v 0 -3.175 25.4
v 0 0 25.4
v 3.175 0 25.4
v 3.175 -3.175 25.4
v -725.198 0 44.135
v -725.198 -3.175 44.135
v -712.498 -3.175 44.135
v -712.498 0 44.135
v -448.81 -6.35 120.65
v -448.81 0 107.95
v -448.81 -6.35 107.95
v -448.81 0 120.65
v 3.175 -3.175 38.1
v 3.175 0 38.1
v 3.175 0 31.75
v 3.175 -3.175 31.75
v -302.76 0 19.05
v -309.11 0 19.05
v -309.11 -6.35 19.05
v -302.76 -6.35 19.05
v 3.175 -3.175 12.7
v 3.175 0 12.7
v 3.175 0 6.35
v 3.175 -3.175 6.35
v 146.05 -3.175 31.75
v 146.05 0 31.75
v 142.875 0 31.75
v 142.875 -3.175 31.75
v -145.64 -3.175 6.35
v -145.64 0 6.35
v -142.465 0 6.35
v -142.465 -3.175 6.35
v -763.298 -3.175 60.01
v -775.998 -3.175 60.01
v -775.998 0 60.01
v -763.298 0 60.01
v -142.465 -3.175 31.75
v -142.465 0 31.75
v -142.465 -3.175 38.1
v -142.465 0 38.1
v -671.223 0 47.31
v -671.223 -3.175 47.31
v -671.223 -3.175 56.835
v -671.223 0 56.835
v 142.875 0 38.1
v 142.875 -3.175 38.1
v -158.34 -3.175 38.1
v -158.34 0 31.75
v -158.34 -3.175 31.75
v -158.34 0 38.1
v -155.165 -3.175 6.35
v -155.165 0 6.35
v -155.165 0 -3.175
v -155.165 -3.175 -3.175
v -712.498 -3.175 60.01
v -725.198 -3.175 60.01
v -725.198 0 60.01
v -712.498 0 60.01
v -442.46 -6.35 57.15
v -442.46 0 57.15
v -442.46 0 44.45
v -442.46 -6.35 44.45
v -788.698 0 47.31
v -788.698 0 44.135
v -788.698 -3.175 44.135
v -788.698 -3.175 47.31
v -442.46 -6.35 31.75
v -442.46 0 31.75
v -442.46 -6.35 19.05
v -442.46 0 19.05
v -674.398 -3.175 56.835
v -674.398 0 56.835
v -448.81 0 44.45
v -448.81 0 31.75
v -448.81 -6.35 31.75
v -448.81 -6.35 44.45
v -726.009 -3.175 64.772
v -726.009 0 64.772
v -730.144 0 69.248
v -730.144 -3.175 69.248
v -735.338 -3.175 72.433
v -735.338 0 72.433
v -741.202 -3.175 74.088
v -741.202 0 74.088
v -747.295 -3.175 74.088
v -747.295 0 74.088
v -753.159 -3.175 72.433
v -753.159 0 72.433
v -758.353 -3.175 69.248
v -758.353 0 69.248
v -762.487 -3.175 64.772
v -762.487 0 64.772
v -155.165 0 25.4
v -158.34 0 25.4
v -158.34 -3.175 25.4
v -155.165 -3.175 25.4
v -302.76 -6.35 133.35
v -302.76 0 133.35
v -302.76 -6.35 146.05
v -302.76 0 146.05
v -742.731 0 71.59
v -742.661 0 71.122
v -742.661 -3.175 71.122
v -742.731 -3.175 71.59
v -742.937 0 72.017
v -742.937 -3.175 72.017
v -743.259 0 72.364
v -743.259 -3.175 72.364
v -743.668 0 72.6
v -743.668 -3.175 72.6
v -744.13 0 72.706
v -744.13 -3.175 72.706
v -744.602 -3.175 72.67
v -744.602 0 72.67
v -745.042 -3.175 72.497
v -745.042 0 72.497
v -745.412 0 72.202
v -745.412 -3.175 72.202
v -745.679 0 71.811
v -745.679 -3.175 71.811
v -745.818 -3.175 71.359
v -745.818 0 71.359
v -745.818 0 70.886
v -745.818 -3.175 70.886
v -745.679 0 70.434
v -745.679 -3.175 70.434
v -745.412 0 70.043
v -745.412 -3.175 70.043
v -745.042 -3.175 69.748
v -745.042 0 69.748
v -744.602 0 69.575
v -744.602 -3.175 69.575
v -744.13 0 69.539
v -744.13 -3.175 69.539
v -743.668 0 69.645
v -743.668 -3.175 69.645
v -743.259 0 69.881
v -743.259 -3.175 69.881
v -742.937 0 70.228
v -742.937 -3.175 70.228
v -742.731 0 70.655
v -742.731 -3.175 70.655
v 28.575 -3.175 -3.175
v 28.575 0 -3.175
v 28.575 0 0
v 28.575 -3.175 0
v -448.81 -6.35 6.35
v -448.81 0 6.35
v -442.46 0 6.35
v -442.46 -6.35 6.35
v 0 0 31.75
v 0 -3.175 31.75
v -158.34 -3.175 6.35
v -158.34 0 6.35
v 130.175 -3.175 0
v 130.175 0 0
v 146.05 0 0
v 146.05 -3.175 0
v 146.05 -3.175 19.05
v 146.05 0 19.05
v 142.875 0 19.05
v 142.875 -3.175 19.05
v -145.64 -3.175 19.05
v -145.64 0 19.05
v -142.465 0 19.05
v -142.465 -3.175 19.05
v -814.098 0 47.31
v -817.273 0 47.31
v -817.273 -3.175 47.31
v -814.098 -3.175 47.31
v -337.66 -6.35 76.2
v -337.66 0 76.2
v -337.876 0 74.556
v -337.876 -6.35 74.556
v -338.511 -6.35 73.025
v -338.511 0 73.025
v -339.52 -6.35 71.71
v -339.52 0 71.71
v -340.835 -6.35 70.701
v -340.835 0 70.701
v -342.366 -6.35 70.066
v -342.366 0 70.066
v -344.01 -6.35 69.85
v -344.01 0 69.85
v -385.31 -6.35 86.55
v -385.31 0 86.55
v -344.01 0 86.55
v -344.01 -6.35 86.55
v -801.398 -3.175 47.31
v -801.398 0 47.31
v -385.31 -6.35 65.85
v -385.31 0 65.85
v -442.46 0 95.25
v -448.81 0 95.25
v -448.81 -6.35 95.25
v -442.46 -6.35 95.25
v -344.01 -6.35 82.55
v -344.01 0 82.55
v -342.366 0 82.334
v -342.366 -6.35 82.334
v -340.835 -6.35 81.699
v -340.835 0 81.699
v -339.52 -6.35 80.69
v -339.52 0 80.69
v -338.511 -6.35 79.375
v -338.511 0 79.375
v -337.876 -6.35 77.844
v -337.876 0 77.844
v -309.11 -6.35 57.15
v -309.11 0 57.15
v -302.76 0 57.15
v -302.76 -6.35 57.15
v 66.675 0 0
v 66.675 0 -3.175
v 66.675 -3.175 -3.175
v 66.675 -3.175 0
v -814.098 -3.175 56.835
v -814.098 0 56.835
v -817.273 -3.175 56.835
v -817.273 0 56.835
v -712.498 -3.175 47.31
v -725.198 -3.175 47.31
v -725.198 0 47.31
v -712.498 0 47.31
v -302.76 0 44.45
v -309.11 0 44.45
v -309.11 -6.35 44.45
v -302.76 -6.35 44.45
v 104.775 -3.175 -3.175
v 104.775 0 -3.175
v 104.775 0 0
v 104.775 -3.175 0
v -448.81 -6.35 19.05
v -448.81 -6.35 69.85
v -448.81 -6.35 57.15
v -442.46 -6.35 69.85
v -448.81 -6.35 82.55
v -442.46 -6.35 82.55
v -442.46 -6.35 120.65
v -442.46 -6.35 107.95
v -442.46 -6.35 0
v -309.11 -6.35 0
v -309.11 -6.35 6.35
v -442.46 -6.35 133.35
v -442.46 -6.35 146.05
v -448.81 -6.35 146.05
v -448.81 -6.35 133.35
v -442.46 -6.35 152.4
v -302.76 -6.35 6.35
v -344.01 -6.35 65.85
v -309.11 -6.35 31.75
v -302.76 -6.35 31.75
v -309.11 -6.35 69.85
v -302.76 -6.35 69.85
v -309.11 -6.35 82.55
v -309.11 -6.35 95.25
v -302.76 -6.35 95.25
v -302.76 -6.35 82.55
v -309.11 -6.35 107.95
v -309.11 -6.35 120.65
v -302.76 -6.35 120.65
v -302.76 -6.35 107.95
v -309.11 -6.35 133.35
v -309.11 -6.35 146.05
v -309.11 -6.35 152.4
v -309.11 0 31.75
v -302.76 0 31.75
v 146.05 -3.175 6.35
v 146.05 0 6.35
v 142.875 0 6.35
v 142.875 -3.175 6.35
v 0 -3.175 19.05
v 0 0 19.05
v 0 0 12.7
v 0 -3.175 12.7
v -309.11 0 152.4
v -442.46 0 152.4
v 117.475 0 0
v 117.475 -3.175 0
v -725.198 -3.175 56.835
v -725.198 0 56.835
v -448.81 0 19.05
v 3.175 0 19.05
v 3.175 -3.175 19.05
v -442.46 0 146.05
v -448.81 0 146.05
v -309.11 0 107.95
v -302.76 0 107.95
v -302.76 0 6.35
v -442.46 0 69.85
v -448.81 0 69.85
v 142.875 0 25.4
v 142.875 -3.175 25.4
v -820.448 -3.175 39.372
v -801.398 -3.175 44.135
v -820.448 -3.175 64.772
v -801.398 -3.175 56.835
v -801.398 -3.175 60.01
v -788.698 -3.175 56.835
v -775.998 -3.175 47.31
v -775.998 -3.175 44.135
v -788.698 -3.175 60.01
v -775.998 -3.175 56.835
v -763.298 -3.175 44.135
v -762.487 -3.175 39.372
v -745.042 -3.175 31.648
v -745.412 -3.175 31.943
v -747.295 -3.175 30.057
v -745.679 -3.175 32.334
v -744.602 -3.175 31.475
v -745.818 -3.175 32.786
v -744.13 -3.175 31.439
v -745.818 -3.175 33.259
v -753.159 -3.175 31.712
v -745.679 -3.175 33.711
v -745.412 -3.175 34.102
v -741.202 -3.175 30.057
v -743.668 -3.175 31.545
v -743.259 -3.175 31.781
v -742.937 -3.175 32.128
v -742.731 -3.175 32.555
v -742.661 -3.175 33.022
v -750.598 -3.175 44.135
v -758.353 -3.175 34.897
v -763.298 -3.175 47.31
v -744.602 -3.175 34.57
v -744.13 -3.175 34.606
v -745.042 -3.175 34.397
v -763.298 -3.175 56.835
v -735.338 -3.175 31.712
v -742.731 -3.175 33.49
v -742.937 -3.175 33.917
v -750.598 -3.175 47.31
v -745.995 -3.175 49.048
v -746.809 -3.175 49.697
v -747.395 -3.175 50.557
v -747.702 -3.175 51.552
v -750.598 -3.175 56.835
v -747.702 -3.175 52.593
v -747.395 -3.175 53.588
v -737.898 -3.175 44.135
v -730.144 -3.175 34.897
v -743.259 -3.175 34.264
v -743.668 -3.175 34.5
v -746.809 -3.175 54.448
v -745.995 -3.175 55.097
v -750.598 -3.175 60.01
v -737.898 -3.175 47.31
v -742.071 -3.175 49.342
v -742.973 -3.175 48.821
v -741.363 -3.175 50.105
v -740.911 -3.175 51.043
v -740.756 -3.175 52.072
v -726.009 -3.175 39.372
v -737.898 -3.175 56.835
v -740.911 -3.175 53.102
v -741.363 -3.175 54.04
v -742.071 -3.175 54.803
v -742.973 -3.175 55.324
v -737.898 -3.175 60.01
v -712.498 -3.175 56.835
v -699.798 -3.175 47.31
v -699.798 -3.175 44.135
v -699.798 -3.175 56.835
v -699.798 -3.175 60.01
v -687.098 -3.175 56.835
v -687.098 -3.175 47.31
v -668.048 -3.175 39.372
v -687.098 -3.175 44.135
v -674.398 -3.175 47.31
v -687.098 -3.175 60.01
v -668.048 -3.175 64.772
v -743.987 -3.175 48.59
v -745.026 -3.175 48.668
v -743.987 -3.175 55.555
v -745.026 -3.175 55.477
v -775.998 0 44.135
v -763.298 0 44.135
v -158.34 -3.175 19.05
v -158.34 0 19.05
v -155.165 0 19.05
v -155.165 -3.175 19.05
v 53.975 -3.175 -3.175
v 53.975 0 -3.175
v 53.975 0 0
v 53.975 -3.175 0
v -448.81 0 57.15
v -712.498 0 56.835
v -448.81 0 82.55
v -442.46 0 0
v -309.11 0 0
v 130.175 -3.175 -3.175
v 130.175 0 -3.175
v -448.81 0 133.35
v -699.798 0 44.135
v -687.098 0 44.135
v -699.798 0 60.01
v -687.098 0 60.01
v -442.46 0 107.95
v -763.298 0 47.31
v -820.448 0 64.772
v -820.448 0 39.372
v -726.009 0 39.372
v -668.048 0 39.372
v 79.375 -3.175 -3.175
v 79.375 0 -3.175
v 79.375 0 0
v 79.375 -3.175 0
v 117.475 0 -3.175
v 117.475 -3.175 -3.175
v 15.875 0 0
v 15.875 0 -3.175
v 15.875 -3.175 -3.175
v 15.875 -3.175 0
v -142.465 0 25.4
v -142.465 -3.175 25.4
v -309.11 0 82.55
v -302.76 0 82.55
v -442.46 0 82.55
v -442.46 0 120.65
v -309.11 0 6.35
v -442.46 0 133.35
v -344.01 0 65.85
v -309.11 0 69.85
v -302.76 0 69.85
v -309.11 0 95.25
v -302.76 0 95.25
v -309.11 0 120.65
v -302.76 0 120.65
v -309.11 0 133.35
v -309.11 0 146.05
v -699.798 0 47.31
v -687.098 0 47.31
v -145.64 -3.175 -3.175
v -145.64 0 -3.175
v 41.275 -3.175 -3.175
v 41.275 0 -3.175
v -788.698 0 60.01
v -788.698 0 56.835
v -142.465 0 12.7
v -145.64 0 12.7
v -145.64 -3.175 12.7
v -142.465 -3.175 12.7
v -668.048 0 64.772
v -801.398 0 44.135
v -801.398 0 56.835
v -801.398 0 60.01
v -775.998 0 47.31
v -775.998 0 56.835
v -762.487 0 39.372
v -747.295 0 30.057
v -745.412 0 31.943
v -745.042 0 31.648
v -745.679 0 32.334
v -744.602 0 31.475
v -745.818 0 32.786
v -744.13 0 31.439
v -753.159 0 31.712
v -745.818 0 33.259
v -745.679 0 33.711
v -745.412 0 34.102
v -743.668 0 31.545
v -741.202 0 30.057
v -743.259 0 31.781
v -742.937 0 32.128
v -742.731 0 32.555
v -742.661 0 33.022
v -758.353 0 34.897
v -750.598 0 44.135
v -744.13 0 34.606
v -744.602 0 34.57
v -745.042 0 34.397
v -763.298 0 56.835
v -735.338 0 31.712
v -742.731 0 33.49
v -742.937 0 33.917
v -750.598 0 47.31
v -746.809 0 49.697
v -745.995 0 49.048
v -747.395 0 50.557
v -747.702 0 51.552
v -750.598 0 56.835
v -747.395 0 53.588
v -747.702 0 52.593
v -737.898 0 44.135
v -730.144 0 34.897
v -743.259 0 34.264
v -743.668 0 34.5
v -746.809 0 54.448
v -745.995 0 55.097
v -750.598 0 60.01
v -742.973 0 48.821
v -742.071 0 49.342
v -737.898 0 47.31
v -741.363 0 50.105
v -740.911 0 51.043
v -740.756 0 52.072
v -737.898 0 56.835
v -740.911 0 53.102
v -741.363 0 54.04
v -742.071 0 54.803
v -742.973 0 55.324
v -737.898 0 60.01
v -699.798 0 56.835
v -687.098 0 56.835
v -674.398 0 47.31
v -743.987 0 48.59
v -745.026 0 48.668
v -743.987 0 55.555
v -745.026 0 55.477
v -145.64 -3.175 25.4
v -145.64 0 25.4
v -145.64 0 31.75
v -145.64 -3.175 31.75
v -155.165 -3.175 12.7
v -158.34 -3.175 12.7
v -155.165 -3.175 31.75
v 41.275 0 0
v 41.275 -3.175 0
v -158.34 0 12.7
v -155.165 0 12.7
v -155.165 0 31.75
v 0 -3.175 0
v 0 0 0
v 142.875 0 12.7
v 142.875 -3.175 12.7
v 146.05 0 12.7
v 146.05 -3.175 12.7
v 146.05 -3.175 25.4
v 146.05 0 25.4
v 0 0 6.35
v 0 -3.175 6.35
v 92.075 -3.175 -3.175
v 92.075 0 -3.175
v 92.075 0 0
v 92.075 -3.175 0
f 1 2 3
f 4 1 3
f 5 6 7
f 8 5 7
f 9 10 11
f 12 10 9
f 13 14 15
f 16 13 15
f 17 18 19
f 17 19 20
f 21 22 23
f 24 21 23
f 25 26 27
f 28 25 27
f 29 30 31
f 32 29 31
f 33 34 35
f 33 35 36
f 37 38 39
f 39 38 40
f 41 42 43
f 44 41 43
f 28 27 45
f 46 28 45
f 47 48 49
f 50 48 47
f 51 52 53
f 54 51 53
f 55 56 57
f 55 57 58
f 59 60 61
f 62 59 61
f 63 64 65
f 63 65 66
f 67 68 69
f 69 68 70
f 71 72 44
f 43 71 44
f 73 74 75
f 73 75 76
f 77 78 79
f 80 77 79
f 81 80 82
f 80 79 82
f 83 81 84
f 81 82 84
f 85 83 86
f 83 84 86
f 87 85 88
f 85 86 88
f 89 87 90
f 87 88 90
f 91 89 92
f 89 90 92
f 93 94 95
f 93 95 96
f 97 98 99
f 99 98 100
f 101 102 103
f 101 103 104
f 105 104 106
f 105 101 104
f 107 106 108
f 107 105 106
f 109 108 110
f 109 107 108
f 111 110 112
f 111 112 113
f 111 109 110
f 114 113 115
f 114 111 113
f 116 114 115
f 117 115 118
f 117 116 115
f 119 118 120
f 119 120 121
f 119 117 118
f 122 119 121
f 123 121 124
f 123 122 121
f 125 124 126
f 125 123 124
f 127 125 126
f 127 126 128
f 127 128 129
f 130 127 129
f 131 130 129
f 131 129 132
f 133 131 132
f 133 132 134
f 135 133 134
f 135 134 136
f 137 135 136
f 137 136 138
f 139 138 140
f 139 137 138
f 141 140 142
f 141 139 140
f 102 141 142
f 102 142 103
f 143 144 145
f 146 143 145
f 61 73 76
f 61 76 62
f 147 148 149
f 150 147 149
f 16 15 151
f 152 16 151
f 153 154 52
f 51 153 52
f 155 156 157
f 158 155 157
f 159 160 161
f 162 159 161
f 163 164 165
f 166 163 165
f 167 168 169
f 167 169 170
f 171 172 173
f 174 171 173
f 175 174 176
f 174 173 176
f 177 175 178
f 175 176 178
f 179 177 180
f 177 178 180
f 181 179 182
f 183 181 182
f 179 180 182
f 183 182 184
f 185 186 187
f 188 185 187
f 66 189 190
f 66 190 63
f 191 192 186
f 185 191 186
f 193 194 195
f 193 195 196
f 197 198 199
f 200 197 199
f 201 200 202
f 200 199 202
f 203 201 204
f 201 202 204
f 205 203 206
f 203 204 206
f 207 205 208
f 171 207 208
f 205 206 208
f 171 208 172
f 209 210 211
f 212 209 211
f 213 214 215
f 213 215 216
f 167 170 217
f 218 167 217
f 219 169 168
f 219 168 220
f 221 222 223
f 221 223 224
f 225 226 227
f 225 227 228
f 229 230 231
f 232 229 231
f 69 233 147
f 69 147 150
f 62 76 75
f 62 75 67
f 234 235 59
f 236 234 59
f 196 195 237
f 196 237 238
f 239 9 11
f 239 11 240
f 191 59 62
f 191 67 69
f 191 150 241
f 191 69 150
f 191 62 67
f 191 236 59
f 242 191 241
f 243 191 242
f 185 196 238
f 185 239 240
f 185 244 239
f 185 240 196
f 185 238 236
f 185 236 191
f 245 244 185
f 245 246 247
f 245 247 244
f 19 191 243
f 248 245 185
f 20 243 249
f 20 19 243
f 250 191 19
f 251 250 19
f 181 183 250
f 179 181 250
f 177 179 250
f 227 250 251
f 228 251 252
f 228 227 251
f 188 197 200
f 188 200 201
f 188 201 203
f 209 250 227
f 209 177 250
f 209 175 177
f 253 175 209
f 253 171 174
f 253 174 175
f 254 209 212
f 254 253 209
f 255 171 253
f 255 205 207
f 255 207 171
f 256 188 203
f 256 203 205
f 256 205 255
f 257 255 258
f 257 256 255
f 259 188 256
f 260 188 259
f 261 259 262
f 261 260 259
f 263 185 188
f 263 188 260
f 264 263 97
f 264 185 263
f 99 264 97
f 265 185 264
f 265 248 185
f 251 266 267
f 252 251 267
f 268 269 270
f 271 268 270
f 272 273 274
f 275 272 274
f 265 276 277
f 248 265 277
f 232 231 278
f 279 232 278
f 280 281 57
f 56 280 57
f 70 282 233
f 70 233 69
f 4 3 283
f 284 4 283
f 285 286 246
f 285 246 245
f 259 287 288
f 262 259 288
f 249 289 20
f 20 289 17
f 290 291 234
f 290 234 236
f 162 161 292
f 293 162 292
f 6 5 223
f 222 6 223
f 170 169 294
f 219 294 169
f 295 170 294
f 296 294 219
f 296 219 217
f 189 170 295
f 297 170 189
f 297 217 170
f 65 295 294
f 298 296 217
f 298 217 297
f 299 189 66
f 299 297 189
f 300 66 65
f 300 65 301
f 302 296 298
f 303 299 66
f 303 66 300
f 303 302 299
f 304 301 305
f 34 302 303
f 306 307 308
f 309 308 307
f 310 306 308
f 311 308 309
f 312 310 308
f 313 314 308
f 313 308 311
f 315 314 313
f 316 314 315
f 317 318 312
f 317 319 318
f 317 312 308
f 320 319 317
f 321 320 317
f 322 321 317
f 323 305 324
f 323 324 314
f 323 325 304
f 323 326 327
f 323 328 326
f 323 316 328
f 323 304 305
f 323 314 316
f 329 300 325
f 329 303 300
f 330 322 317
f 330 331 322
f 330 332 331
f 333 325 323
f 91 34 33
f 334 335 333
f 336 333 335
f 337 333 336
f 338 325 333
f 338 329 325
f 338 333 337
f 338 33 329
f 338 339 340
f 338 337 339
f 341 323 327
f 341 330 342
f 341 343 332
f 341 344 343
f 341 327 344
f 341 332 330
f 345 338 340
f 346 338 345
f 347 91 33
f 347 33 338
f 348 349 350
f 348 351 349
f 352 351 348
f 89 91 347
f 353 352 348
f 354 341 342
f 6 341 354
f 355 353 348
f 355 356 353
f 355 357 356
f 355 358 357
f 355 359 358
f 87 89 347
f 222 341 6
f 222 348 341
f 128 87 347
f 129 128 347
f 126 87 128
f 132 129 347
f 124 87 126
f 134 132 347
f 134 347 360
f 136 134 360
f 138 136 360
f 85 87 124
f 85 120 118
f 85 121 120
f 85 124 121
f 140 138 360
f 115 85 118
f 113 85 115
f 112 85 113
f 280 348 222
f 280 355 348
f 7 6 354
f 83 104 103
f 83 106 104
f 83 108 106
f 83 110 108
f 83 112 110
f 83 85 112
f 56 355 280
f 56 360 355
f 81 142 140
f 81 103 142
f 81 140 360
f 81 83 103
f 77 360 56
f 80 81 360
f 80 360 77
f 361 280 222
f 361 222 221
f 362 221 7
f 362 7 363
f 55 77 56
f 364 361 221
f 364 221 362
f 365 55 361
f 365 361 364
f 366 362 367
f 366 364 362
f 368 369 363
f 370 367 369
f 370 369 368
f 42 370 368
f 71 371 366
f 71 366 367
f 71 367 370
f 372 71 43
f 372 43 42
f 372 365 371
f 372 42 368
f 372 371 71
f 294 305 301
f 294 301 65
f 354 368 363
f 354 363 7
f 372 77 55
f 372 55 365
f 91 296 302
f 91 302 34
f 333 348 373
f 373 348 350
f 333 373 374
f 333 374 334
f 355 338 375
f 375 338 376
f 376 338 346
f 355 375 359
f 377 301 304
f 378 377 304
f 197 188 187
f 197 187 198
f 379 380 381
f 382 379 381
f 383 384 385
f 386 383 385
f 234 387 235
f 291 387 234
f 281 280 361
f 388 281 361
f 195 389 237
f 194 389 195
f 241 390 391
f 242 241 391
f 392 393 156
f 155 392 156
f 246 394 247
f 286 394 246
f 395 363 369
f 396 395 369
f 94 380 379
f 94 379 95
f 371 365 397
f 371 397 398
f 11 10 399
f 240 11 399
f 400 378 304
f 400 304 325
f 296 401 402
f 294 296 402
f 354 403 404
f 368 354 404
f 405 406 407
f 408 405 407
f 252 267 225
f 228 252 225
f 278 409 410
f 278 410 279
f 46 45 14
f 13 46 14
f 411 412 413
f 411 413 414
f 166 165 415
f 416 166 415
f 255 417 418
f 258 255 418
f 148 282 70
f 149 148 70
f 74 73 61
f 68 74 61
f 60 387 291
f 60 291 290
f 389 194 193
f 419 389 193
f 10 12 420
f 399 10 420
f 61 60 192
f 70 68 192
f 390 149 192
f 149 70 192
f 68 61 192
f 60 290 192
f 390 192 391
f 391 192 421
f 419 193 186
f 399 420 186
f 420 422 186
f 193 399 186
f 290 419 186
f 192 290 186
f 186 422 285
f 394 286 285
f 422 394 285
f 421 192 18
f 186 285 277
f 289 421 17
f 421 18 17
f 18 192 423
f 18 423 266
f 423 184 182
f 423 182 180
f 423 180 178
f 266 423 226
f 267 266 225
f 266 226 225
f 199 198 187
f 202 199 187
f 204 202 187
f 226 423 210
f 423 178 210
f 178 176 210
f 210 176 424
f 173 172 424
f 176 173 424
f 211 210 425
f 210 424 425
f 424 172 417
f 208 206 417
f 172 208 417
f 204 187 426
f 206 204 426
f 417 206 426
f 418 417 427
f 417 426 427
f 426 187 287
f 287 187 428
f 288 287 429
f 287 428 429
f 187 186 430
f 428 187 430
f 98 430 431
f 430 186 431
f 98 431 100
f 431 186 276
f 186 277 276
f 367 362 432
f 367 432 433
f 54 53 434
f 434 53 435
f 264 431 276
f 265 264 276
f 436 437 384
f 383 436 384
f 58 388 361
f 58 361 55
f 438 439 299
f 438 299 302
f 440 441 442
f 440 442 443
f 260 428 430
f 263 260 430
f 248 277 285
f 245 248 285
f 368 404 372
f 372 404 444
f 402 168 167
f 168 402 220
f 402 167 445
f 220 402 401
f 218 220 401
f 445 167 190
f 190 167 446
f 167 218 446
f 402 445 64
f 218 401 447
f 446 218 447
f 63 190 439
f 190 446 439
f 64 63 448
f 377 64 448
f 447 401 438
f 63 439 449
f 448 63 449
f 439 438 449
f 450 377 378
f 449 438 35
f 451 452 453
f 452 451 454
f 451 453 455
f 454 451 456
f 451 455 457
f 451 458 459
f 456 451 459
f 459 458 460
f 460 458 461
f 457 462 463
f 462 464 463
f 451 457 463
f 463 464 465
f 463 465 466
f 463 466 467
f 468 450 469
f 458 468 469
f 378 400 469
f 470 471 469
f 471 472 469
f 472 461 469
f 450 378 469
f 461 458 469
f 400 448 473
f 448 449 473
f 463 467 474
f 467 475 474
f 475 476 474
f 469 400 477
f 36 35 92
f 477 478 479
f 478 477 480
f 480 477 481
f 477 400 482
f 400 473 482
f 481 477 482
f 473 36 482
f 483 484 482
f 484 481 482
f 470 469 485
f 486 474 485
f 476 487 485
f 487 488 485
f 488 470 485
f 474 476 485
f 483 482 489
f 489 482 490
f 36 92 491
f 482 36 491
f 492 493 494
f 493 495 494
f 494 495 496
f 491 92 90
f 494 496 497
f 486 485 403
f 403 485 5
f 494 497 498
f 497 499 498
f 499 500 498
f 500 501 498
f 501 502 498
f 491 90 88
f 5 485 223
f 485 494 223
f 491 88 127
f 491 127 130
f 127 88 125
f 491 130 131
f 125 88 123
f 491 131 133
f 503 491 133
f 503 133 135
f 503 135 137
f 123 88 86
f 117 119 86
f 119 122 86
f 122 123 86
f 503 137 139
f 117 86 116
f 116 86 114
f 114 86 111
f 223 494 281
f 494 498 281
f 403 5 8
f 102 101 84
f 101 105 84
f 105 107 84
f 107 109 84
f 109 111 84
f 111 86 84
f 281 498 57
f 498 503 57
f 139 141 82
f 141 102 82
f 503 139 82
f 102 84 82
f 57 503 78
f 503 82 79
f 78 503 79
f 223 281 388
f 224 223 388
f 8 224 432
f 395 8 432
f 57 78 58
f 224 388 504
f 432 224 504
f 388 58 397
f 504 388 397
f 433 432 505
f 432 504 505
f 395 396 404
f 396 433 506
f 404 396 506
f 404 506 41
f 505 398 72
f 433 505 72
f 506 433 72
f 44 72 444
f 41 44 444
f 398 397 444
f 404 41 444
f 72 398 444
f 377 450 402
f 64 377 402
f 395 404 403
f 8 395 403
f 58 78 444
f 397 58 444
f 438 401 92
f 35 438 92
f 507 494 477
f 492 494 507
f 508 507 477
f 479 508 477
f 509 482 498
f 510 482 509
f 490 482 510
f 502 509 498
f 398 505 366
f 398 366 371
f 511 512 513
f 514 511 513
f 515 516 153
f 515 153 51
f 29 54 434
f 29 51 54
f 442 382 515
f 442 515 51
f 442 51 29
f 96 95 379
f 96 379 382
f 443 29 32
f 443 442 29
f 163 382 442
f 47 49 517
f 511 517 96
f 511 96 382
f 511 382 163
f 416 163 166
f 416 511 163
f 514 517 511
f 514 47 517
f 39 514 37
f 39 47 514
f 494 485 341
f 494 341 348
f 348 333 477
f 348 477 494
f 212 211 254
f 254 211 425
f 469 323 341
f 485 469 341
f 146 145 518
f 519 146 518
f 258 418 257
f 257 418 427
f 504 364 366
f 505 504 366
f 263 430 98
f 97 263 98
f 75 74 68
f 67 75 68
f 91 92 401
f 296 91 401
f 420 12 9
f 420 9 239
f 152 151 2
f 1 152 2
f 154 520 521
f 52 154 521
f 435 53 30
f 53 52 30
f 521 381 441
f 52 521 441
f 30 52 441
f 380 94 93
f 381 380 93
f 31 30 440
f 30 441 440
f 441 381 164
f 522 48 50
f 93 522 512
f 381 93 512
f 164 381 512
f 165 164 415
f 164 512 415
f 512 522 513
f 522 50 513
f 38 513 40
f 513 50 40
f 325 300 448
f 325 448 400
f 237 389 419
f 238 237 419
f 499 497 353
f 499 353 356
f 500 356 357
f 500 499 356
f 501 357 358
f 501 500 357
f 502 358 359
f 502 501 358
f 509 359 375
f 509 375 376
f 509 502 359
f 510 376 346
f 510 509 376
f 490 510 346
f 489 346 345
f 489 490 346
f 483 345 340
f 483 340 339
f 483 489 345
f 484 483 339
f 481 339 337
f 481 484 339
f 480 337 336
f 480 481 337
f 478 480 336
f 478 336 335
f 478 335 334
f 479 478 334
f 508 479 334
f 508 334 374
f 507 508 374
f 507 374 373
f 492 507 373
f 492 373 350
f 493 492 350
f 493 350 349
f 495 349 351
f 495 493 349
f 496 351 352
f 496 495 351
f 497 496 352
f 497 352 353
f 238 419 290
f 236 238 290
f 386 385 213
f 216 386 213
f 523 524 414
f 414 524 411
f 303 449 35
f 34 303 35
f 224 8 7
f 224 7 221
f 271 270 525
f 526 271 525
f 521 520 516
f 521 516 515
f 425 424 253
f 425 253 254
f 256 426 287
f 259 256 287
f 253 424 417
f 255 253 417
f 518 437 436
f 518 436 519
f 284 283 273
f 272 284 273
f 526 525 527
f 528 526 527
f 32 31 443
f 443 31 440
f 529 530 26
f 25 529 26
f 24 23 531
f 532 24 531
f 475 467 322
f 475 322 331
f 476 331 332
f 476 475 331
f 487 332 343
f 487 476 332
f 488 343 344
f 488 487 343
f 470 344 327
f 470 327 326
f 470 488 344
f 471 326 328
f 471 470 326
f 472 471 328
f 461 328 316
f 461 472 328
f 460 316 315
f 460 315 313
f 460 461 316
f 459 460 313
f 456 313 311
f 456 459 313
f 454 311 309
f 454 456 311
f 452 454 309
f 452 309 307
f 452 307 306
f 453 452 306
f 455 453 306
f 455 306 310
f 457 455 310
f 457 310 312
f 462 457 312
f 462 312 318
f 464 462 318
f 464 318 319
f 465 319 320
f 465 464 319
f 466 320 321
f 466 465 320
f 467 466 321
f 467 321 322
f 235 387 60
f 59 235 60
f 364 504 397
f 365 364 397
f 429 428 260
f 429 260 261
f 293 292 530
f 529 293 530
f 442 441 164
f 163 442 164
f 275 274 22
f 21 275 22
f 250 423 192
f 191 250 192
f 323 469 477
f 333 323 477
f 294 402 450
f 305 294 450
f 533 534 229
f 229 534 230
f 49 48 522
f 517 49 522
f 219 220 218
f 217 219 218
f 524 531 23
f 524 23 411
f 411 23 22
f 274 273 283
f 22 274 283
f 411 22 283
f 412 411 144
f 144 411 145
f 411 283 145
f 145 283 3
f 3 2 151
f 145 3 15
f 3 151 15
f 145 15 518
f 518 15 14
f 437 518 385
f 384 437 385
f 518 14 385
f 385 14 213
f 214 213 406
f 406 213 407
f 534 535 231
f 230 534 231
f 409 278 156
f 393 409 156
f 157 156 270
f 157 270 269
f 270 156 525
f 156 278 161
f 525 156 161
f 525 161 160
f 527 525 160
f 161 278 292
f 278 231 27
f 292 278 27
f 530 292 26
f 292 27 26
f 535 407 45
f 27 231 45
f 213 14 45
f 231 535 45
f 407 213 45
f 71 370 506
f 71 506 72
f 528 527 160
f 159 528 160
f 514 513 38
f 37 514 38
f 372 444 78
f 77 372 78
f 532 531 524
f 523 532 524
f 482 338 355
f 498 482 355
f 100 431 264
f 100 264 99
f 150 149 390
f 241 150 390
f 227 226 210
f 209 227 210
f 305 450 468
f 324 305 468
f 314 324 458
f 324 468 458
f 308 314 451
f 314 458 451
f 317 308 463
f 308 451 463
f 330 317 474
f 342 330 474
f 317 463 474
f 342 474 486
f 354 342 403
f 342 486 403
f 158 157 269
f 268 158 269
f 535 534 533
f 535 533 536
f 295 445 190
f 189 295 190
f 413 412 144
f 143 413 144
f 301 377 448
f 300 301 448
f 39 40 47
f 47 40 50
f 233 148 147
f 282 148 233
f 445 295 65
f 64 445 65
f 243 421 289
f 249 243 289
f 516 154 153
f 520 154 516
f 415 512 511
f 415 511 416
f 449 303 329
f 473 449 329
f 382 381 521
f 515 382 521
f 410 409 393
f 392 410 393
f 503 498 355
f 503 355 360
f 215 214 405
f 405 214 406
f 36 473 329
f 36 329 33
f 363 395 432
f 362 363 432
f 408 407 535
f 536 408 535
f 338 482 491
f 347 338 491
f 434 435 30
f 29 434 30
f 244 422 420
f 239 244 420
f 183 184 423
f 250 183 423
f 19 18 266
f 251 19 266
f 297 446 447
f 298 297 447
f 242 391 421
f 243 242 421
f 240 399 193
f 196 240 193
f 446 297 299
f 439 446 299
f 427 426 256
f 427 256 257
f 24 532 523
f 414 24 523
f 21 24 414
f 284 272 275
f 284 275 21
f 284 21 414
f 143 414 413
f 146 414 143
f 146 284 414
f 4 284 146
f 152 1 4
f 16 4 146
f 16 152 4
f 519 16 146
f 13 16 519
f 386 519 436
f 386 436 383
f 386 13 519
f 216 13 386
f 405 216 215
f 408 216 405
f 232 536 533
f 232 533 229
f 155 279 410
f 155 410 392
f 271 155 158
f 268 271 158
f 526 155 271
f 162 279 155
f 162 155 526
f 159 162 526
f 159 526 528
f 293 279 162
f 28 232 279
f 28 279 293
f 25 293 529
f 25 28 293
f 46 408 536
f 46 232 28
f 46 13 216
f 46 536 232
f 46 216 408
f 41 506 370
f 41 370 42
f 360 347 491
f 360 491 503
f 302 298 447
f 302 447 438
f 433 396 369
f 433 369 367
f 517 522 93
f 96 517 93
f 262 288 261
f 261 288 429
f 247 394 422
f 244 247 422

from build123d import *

# Parameters (mm, degrees)
F0_W     = 12.7
F0_H     = 3.175
F1_DEPTH = 3.175
F2_W     = 9.525
F2_H     = 3.175
F2_W_2   = 3.175
F2_H_2   = 6.35
F3_DEPTH = 3.175
F4_W     = 6.35
F4_H     = 12.7
F5_DEPTH = 6.35
F6_R     = 3.4925
F6_R_2   = 1.5875
F7_DEPTH = 3.175
F8_W     = 12.7
F8_H     = 3.175
F8_W_2   = 3.175
F8_H_2   = 9.525
F9_DEPTH = 3.175


with BuildPart() as f1:
    # F0 (on Front) → F1 (new body)
    with BuildSketch(Plane.XZ):
        Polygon((0, 6.35), (0, 0), (15.875, 0), (28.575, 0), (41.275, 0), (53.975, 0), (66.675, 0), (79.375, 0), (92.075, 0), (104.775, 0), (117.475, 0), (130.175, 0), (146.05, 0), (146.05, 6.35), (142.875, 6.35), (142.875, 12.7), (146.05, 12.7), (146.05, 19.05), (142.875, 19.05), (142.875, 25.4), (146.05, 25.4), (146.05, 31.75), (142.875, 31.75), (142.875, 38.1), (3.175, 38.1), (3.175, 31.75), (0, 31.75), (0, 25.4), (3.175, 25.4), (3.175, 19.05), (0, 19.05), (0, 12.7), (3.175, 12.7), (3.175, 6.35), align=None)
        with Locations((22.225, -1.5875)):
            Rectangle(F0_W, F0_H)
        with Locations((47.625, -1.5875)):
            Rectangle(F0_W, F0_H)
        with Locations((73.025, -1.5875)):
            Rectangle(F0_W, F0_H)
        with Locations((98.425, -1.5875)):
            Rectangle(F0_W, F0_H)
        with Locations((123.825, -1.5875)):
            Rectangle(F0_W, F0_H)
    extrude(amount=F1_DEPTH)


with BuildPart() as f3:
    # F2 (on Front) → F3 (new body)
    with BuildSketch(Plane.XZ):
        with Locations((-150.4022690821, -1.5875)):
            Rectangle(F2_W, F2_H)
        Polygon((-155.1647690821, 0), (-145.6397690821, 0), (-145.6397690821, 6.35), (-145.6397690821, 12.7), (-145.6397690821, 19.05), (-145.6397690821, 25.4), (-145.6397690821, 31.75), (-145.6397690821, 38.1), (-155.1647690821, 38.1), (-155.1647690821, 31.75), (-155.1647690821, 25.4), (-155.1647690821, 19.05), (-155.1647690821, 12.7), (-155.1647690821, 6.35), align=None)
        with Locations((-144.0522690821, 9.525)):
            Rectangle(F2_W_2, F2_H_2)
        with Locations((-156.7522690821, 9.525)):
            Rectangle(F2_W_2, F2_H_2)
        with Locations((-144.0522690821, 22.225)):
            Rectangle(F2_W_2, F2_H_2)
        with Locations((-156.7522690821, 22.225)):
            Rectangle(F2_W_2, F2_H_2)
        with Locations((-144.0522690821, 34.925)):
            Rectangle(F2_W_2, F2_H_2)
        with Locations((-156.7522690821, 34.925)):
            Rectangle(F2_W_2, F2_H_2)
    extrude(amount=F3_DEPTH)


with BuildPart() as f5:
    # F4 (on Front) → F5 (new body)
    with BuildSketch(Plane.XZ):
        Polygon((-442.4599377941, 0), (-309.1099377941, 0), (-309.1099377941, 6.35), (-309.1099377941, 19.05), (-309.1099377941, 31.75), (-309.1099377941, 44.45), (-309.1099377941, 57.15), (-309.1099377941, 69.85), (-309.1099377941, 82.55), (-309.1099377941, 95.25), (-309.1099377941, 107.95), (-309.1099377941, 120.65), (-309.1099377941, 133.35), (-309.1099377941, 146.05), (-309.1099377941, 152.4), (-442.4599377941, 152.4), (-442.4599377941, 146.05), (-442.4599377941, 133.35), (-442.4599377941, 127), (-442.4599377941, 120.65), (-442.4599377941, 107.95), (-442.4599377941, 101.6), (-442.4599377941, 95.25), (-442.4599377941, 82.55), (-442.4599377941, 76.2), (-442.4599377941, 69.85), (-442.4599377941, 57.15), (-442.4599377941, 50.8), (-442.4599377941, 44.45), (-442.4599377941, 31.75), (-442.4599377941, 19.05), (-442.4599377941, 6.35), align=None)
        with BuildLine():
            Line((-385.3099377941, 65.85), (-385.3099377941, 86.55))
            Line((-385.3099377941, 86.55), (-344.0099377941, 86.55))
            Line((-344.0099377941, 86.55), (-344.0099377941, 82.55))
            ThreePointArc((-344.0099377941, 82.55), (-339.5198097336, 80.6901280605), (-337.6599377941, 76.2))
            ThreePointArc((-337.6599377941, 76.2), (-339.5198097336, 71.7098719395), (-344.0099377941, 69.85))
            Line((-344.0099377941, 69.85), (-344.0099377941, 65.85))
            Line((-344.0099377941, 65.85), (-385.3099377941, 65.85))
        make_face(mode=Mode.SUBTRACT)
        with Locations((-305.9349377941, 12.7)):
            Rectangle(F4_W, F4_H)
        with Locations((-445.6349377941, 12.7)):
            Rectangle(F4_W, F4_H)
        with Locations((-305.9349377941, 38.1)):
            Rectangle(F4_W, F4_H)
        with Locations((-445.6349377941, 38.1)):
            Rectangle(F4_W, F4_H)
        with Locations((-305.9349377941, 63.5)):
            Rectangle(F4_W, F4_H)
        with Locations((-445.6349377941, 63.5)):
            Rectangle(F4_W, F4_H)
        with Locations((-305.9349377941, 88.9)):
            Rectangle(F4_W, F4_H)
        with Locations((-305.9349377941, 114.3)):
            Rectangle(F4_W, F4_H)
        with Locations((-445.6349377941, 88.9)):
            Rectangle(F4_W, F4_H)
        with Locations((-305.9349377941, 139.7)):
            Rectangle(F4_W, F4_H)
        with Locations((-445.6349377941, 114.3)):
            Rectangle(F4_W, F4_H)
        with Locations((-445.6349377941, 139.7)):
            Rectangle(F4_W, F4_H)
    extrude(amount=F5_DEPTH)


with BuildPart() as f7:
    # F6 (on Front) → F7 (new body)
    with BuildSketch(Plane.XZ):
        with BuildLine():
            ThreePointArc((-726.009471792, 39.3724814057), (-723.043363314, 45.4170643565), (-722.0234581947, 52.0724814057))
            ThreePointArc((-722.0234581947, 52.0724814057), (-723.043363314, 58.727898455), (-726.009471792, 64.7724814057))
            Line((-726.009471792, 64.7724814057), (-762.4874445975, 64.7724814057))
            ThreePointArc((-762.4874445975, 64.7724814057), (-766.4734581947, 52.0724814057), (-762.4874445975, 39.3724814057))
            Line((-762.4874445975, 39.3724814057), (-726.009471792, 39.3724814057))
        make_face()
        with Locations((-744.2484581947, 52.0724814057)):
            Circle(F6_R, mode=Mode.SUBTRACT)
        with BuildLine():
            ThreePointArc((-762.4874445975, 39.3724814057), (-766.4734581947, 52.0724814057), (-762.4874445975, 64.7724814057))
            Line((-762.4874445975, 64.7724814057), (-820.4484581947, 64.7724814057))
            Line((-820.4484581947, 64.7724814057), (-820.4484581947, 39.3724814057))
            Line((-820.4484581947, 39.3724814057), (-762.4874445975, 39.3724814057))
        make_face()
        with BuildLine():
            ThreePointArc((-726.009471792, 64.7724814057), (-723.043363314, 58.727898455), (-722.0234581947, 52.0724814057))
            ThreePointArc((-722.0234581947, 52.0724814057), (-723.043363314, 45.4170643565), (-726.009471792, 39.3724814057))
            Line((-726.009471792, 39.3724814057), (-668.0484581947, 39.3724814057))
            Line((-668.0484581947, 39.3724814057), (-668.0484581947, 64.7724814057))
            Line((-668.0484581947, 64.7724814057), (-726.009471792, 64.7724814057))
        make_face()
        with BuildLine():
            Line((-762.4874445975, 64.7724814057), (-726.009471792, 64.7724814057))
            ThreePointArc((-726.009471792, 64.7724814057), (-744.2484581947, 74.2974814057), (-762.4874445975, 64.7724814057))
        make_face()
        with Locations((-744.2484581947, 71.1224814057)):
            Circle(F6_R_2, mode=Mode.SUBTRACT)
        with BuildLine():
            ThreePointArc((-762.4874445975, 39.3724814057), (-744.2484581947, 29.8474814057), (-726.009471792, 39.3724814057))
            Line((-726.009471792, 39.3724814057), (-762.4874445975, 39.3724814057))
        make_face()
        with Locations((-744.2484581947, 33.0224814057)):
            Circle(F6_R_2, mode=Mode.SUBTRACT)
    extrude(amount=F7_DEPTH)

    # F8 (on face) → F9 (cut, through all)
    with BuildSketch(Plane.XZ.offset(3.175)):
        with Locations((-744.2484581947, 58.4224814057)):
            Rectangle(F8_W, F8_H)
        with Locations((-769.6484581947, 58.4224814057)):
            Rectangle(F8_W, F8_H)
        with Locations((-795.0484581947, 58.4224814057)):
            Rectangle(F8_W, F8_H)
        with Locations((-718.8484581947, 58.4224814057)):
            Rectangle(F8_W, F8_H)
        with Locations((-693.4484581947, 58.4224814057)):
            Rectangle(F8_W, F8_H)
        with Locations((-744.2484581947, 45.7224814057)):
            Rectangle(F8_W, F8_H)
        with Locations((-769.6484581947, 45.7224814057)):
            Rectangle(F8_W, F8_H)
        with Locations((-718.8484581947, 45.7224814057)):
            Rectangle(F8_W, F8_H)
        with Locations((-795.0484581947, 45.7224814057)):
            Rectangle(F8_W, F8_H)
        with Locations((-693.4484581947, 45.7224814057)):
            Rectangle(F8_W, F8_H)
        with Locations((-815.6859581947, 52.0724814057)):
            Rectangle(F8_W_2, F8_H_2)
        with Locations((-672.8109581947, 52.0724814057)):
            Rectangle(F8_W_2, F8_H_2)
    extrude(amount=-F9_DEPTH, mode=Mode.SUBTRACT)


solid = Compound([f1.part, f3.part, f5.part, f7.part])
